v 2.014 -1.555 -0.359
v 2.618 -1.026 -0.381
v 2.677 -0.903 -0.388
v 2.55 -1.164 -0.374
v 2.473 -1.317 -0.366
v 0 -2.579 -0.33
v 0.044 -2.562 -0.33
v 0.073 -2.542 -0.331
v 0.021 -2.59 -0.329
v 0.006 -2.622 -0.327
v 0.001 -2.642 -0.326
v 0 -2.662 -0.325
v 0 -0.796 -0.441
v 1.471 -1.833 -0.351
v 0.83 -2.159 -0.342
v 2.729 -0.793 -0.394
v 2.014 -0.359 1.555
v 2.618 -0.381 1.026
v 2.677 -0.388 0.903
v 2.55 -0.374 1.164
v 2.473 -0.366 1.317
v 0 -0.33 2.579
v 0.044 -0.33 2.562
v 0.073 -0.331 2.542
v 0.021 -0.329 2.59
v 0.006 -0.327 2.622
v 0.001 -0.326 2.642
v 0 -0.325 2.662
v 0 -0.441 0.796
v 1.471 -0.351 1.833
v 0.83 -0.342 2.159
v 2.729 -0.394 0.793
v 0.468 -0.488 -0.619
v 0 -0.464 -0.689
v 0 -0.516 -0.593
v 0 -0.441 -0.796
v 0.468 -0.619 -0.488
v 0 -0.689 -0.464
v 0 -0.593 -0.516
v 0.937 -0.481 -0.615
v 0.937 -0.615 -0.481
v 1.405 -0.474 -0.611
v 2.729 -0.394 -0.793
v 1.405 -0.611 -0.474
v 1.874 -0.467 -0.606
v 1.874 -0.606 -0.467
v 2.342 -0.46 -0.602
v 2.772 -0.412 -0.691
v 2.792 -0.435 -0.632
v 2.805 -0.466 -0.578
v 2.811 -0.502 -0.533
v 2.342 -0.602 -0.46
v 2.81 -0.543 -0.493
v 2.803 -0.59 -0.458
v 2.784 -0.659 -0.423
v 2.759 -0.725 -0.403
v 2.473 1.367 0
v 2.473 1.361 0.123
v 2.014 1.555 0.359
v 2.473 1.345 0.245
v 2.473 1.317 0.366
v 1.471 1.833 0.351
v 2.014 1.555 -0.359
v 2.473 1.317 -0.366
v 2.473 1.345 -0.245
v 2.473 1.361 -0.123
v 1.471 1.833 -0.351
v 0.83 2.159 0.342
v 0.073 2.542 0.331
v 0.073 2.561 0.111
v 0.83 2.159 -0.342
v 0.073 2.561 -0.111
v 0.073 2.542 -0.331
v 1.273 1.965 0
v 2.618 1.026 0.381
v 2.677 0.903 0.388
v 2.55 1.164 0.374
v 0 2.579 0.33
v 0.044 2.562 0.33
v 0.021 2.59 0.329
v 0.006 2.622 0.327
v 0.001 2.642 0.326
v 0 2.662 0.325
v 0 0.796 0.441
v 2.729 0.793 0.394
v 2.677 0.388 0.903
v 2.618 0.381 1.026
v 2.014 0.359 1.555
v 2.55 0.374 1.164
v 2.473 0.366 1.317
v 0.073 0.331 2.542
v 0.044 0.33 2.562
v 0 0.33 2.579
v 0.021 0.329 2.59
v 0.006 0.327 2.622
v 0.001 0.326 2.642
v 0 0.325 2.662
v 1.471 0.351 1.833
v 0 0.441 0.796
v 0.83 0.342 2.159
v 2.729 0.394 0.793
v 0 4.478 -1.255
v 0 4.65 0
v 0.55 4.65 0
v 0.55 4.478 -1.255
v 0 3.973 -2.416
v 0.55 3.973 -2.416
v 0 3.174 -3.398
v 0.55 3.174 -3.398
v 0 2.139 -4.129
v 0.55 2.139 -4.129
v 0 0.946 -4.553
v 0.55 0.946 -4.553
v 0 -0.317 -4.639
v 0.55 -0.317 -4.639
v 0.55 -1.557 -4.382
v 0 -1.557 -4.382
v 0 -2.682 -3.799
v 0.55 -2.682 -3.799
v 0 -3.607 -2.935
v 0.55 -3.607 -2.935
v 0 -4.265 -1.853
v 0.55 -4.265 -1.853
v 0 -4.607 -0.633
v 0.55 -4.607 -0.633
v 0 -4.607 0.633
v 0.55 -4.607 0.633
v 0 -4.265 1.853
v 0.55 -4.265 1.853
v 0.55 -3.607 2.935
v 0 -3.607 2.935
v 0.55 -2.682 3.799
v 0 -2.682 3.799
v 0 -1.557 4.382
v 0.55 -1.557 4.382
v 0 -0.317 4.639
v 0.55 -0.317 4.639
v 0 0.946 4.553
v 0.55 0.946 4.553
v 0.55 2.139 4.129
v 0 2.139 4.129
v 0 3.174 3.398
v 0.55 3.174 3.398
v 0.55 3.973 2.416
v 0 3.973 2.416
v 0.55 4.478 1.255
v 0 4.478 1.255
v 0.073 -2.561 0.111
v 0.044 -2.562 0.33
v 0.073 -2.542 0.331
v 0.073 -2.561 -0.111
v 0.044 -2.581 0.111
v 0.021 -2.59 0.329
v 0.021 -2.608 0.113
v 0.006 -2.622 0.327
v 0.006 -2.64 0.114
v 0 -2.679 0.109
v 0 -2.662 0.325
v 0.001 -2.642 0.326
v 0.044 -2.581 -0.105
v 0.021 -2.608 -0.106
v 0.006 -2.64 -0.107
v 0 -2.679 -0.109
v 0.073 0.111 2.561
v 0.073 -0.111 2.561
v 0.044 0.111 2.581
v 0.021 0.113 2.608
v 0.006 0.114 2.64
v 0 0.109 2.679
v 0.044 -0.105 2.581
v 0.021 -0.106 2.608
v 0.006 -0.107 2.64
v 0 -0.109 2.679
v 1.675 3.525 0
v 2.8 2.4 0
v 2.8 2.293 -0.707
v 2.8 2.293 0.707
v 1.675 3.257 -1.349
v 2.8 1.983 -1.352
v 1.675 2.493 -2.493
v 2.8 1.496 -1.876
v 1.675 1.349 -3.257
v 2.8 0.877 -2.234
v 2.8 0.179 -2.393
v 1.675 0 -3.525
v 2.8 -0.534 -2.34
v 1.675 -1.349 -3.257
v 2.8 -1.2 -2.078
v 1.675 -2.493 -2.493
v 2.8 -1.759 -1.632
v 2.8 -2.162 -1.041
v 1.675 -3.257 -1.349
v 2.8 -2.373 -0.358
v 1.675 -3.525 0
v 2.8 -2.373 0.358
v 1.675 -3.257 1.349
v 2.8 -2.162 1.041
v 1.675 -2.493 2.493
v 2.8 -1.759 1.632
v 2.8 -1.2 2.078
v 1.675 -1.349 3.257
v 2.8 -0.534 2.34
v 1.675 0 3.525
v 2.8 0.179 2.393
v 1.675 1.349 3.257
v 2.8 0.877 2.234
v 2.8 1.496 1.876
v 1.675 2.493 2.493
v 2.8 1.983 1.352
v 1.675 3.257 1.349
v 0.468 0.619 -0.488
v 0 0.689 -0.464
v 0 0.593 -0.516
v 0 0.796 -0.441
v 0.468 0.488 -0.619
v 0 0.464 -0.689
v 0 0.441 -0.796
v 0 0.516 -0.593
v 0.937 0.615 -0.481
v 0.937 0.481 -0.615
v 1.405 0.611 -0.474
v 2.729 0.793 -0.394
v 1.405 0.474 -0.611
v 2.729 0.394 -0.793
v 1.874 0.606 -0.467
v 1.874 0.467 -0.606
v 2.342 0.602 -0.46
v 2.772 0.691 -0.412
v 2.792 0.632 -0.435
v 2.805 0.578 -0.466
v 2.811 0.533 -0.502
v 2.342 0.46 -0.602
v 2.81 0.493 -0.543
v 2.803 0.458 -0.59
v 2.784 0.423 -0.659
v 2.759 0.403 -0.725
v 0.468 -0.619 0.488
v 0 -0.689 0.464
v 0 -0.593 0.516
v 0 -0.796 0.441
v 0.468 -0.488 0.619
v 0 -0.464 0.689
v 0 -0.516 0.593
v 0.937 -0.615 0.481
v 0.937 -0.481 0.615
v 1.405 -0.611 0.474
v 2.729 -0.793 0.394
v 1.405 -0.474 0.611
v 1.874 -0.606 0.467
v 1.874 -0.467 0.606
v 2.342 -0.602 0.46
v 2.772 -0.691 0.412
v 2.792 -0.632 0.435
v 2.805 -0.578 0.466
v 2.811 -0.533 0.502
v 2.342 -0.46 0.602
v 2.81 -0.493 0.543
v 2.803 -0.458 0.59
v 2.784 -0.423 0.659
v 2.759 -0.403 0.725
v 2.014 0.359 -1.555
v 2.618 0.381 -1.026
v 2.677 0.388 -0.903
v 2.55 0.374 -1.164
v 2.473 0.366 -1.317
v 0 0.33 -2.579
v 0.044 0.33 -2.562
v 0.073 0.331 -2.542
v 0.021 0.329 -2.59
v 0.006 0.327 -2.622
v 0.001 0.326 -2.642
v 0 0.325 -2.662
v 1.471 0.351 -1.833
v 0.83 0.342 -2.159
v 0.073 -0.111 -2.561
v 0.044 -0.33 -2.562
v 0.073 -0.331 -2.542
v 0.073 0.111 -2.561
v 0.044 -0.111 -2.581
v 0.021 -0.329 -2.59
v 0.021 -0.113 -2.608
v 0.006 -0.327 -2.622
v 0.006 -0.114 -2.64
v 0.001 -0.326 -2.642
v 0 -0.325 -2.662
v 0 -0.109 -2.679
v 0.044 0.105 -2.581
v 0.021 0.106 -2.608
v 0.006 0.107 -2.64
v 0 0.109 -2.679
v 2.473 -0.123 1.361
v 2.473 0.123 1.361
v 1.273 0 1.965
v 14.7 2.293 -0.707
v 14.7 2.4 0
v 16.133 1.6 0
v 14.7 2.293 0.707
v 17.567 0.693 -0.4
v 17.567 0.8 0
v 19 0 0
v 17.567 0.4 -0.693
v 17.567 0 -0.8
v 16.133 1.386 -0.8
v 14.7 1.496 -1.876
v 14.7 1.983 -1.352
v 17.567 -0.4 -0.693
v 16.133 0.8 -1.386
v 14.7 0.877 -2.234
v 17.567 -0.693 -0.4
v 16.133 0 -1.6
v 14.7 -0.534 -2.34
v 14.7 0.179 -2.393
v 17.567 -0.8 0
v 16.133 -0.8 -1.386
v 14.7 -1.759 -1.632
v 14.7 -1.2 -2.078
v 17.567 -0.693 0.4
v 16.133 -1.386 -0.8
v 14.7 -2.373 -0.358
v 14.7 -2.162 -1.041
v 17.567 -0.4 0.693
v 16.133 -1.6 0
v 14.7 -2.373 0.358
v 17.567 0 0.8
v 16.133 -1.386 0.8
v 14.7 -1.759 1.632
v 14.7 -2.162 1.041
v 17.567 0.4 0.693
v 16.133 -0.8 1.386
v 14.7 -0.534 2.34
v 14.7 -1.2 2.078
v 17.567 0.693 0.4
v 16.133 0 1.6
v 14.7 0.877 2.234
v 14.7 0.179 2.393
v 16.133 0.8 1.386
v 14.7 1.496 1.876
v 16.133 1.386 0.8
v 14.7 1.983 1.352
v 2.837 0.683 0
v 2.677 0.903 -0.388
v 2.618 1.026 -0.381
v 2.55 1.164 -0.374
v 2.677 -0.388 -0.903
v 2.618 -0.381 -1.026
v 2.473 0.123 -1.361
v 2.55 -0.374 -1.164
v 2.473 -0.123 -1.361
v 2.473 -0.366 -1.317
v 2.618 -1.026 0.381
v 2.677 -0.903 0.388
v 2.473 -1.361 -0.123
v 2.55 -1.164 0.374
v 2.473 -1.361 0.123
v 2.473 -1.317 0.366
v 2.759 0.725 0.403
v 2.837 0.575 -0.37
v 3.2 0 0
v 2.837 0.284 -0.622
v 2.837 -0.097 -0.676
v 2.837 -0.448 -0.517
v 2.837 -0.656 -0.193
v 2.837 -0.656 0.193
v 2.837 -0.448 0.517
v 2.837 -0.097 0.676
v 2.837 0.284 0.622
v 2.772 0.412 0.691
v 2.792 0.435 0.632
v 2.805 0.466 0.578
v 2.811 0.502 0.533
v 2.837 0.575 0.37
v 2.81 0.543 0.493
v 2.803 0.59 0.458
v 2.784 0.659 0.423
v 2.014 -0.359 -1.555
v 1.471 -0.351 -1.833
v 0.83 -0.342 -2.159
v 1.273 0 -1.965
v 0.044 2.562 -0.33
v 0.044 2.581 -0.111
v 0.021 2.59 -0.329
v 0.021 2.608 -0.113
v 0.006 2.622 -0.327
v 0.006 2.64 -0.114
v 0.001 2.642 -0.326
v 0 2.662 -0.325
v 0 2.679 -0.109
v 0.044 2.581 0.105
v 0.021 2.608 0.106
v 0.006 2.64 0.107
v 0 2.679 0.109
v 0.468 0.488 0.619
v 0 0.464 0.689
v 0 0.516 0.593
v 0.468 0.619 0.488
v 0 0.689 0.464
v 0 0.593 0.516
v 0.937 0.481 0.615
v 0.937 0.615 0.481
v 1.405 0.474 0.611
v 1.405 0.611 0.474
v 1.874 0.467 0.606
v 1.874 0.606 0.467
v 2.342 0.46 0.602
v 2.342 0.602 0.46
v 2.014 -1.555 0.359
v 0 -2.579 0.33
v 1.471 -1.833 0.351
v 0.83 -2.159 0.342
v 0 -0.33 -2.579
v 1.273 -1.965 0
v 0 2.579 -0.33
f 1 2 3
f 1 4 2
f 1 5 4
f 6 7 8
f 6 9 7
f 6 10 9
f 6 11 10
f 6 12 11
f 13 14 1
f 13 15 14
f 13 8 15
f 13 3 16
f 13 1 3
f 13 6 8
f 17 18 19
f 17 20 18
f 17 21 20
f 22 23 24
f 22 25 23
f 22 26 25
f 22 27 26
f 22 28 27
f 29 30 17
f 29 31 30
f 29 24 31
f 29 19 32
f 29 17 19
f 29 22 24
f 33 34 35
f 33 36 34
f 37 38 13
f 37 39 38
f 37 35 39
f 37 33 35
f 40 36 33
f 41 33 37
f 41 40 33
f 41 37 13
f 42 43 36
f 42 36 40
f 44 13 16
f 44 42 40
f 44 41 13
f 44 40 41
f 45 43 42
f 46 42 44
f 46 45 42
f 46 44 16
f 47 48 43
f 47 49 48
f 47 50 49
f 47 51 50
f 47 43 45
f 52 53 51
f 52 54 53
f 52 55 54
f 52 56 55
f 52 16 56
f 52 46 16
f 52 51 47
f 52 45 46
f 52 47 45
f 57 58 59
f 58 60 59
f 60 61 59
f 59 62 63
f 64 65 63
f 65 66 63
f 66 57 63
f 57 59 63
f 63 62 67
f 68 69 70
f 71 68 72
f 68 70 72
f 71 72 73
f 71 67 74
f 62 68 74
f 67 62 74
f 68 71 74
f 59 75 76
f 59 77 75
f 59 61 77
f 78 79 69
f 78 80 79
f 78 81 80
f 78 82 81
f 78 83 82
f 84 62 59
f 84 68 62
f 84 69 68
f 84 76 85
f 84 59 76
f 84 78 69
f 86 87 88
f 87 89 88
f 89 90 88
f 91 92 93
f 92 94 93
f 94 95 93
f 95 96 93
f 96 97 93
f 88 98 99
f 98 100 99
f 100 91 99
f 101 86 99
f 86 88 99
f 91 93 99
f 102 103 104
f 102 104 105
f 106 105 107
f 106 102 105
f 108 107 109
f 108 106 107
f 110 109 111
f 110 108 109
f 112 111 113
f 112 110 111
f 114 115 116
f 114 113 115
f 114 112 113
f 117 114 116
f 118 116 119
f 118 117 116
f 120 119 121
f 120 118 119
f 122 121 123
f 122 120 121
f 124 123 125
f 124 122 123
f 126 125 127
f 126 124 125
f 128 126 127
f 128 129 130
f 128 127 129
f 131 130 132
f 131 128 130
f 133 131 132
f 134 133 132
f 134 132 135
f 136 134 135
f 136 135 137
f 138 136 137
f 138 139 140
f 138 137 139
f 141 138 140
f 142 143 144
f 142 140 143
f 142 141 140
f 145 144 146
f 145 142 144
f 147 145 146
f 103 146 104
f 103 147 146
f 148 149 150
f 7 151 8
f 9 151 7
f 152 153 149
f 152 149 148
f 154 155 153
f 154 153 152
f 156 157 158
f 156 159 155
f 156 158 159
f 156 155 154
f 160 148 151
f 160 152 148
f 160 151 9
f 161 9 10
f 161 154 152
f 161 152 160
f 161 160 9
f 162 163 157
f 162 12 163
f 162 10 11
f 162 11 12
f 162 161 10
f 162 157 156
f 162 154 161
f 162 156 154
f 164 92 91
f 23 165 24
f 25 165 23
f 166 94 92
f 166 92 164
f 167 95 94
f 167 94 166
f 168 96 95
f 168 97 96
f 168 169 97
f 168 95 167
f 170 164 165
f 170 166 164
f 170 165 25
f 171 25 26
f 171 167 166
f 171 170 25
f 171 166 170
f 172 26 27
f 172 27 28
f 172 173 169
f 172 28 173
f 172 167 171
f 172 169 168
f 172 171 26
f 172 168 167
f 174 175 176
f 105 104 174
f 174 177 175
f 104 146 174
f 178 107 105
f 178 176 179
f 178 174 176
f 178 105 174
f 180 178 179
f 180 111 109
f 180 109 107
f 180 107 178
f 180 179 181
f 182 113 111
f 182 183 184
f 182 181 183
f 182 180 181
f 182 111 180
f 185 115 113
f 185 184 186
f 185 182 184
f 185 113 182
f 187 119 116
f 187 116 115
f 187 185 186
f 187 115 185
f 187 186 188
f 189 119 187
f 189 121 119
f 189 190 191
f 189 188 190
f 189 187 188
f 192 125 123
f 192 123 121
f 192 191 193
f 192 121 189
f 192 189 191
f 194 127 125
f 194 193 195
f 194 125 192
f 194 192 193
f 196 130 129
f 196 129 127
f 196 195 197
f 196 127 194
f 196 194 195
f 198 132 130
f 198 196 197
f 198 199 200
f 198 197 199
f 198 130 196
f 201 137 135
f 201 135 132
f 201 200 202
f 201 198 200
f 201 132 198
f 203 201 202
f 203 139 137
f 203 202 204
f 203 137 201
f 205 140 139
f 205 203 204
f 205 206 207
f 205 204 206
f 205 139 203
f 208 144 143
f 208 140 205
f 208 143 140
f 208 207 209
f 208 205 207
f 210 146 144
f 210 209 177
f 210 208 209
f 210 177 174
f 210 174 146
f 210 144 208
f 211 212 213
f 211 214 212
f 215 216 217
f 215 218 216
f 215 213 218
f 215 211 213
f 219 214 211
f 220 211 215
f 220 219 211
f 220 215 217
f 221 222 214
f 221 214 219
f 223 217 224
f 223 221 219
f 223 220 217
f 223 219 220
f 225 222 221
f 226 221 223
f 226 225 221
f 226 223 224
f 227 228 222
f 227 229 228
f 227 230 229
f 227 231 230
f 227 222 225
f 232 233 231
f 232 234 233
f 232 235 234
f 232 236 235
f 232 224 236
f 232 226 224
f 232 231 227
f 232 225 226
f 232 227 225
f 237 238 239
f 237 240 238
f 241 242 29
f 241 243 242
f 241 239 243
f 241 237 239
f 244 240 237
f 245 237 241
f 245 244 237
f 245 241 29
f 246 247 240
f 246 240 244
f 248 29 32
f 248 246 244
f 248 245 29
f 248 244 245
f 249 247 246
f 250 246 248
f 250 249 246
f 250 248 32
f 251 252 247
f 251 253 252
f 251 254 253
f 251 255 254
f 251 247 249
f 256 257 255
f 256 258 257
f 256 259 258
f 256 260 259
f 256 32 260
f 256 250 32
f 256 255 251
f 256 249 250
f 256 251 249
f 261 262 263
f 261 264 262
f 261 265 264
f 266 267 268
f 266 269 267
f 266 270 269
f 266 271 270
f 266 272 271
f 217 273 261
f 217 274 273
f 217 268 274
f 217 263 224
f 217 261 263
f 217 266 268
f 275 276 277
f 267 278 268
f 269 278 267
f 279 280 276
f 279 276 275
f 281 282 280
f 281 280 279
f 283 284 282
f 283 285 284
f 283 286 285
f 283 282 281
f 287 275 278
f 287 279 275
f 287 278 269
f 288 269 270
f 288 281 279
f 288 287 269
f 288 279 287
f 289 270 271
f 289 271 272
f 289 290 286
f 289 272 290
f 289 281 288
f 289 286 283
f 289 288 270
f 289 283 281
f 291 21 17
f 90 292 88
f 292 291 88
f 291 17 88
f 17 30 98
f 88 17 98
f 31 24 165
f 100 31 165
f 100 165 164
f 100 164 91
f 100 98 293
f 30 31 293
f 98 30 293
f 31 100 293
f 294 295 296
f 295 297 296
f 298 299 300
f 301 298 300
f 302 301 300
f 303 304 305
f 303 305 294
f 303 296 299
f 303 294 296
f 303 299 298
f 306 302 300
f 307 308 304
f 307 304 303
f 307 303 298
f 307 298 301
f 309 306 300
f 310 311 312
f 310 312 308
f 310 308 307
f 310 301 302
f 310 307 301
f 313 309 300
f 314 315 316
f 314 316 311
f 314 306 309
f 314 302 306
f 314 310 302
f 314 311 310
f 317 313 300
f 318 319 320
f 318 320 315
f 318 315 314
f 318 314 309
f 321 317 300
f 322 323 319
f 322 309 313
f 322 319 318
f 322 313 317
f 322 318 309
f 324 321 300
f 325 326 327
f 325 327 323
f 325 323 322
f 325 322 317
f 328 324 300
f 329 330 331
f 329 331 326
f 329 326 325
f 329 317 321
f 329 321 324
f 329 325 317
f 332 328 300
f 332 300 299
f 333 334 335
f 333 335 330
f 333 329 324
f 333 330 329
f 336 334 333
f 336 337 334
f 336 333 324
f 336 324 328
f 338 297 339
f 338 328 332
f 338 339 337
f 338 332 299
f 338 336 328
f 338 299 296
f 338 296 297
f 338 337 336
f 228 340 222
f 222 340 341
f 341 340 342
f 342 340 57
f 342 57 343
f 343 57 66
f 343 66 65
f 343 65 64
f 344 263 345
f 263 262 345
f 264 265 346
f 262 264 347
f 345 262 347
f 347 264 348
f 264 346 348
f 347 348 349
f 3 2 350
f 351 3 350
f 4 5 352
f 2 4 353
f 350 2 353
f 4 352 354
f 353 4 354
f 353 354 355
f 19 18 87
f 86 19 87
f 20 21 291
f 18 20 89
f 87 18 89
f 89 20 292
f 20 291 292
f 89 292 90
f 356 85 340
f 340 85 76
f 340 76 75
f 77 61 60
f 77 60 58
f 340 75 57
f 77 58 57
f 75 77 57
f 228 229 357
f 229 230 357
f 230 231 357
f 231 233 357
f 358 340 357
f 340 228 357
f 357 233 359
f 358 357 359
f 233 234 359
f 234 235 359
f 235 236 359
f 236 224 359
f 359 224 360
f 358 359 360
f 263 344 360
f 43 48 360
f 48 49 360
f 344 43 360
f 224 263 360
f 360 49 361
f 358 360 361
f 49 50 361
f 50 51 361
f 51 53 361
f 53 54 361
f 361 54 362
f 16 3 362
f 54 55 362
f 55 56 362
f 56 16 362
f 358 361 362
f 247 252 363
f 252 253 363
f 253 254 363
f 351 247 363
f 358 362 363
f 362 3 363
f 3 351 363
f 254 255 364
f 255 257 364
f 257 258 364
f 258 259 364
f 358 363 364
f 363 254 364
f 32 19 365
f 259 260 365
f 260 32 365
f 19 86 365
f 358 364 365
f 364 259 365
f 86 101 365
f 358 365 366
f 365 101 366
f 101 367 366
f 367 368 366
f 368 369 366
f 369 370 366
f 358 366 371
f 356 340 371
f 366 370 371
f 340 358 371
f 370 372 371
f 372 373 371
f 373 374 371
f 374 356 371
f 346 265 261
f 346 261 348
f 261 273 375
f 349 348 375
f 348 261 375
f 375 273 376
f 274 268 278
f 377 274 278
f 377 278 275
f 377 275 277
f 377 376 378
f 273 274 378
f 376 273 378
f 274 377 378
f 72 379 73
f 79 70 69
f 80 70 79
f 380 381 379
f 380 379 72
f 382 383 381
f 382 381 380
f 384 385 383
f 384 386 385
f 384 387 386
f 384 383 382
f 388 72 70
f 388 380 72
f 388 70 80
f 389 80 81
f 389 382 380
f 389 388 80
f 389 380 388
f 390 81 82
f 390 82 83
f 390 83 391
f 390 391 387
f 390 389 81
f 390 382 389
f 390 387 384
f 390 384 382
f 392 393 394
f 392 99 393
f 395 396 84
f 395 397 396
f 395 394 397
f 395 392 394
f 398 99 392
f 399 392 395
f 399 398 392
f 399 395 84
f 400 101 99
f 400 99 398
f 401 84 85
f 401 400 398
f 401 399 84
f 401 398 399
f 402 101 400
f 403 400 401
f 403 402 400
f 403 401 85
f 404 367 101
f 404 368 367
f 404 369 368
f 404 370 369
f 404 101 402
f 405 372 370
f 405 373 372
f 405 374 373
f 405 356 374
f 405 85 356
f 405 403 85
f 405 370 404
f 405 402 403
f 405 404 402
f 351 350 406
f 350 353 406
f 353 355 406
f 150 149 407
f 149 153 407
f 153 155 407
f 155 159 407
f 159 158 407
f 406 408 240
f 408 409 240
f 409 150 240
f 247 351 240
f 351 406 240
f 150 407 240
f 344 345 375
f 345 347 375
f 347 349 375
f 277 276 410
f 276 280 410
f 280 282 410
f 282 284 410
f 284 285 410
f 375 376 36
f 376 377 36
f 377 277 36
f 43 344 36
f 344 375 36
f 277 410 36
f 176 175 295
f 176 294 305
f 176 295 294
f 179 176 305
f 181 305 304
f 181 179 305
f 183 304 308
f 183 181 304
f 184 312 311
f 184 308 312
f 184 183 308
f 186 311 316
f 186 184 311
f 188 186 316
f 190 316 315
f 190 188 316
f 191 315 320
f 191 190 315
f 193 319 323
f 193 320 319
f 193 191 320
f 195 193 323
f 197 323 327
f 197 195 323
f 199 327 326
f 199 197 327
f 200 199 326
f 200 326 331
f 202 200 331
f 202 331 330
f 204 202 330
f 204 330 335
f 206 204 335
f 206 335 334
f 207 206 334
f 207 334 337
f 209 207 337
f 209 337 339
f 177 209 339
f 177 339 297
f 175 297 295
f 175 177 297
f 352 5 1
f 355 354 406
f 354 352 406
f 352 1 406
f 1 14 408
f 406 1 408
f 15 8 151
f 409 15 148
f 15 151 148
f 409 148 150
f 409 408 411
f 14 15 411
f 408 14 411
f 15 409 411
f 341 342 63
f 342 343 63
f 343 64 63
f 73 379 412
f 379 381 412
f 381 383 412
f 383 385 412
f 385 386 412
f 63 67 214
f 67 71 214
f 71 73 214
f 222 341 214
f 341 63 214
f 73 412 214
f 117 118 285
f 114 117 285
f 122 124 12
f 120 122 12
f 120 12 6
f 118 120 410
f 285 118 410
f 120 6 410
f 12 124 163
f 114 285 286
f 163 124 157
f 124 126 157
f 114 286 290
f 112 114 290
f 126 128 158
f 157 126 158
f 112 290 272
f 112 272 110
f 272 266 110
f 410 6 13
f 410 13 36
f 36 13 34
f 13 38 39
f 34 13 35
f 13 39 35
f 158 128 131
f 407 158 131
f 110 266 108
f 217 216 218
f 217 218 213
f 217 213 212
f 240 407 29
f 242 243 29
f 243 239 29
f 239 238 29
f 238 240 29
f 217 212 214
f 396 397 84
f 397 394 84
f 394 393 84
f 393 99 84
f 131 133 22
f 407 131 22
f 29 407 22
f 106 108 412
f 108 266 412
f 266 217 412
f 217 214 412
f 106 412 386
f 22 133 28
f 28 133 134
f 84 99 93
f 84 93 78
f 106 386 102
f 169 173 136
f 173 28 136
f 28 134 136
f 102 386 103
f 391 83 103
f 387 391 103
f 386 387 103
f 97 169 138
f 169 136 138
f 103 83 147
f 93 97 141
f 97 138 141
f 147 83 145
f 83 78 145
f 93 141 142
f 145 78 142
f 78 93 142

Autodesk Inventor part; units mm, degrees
ref_plane "YZ Plane" through (0, 0, 0) normal (1, 0, 0) x (0, 1, 0)
ref_plane "XZ Plane" through (0, 0, 0) normal (0, 1, 0) x (-1, 0, 0)
sketch "Sketch1" plane through (0, 0, 0) normal (0, 0, 1) x (1, 0, 0)
  line L0 (3.2, 0) -> (19, 0)
  line L1 (19, 0) -> (19, 2.4)
  line L2 (19, 2.4) -> (2.8, 2.4)
  line L3 (0.55, 4.65) -> (0, 4.65)
  line L4 (-3.8, 0) -> (22.8, 0) projected
  line L5 (0, -0.93) -> (0, 5.58) projected
  line L6 (0, 2.6) -> (2.4732, 1.3669)
  line L7 (2.4732, 1.3669) -> (3.2, 0)
  line L8 (2.8, 2.4) -> (0.55, 4.65)
  line L9 (0, 4.65) -> (0, 2.6)
  dimension "d2" = 4.8
  dimension "d3" = 9.3
  dimension "d4" = 3.2
  dimension "d5" = 5.2
  dimension "d6" = 26.5
  dimension "d7" = 62
  dimension "d13" = 45
  dimension "d14" = 2.8
  dimension "d15" = 19
revolve "Body" add sketch "Sketch1" angle 360 about axis through (3.2, 0, 0) along (1, 0, 0) contours L7 L6 L5 L3 L8 L2 L1 L0
sketch "Sketch2" plane through (0, 0, 0) normal (-1, 0, 0) x (0, 0, 1)
  line L0 (0, -6.51) -> (0, 6.51) projected
  line L1 (-6.51, 0) -> (6.51, 0) projected
  line L2 (0, 2.6) -> (0, 0) construction
  line L3 (0, 0) -> (2.6, 0) construction
  arc A0 (0.78, 0) -> (0, 0.78) centre (0, 0) ccw construction
  line L4 (0, 0) -> (3.288, 3.288) construction
  arc A1 (0.91, 0) -> (0, 0.91) centre (0, 0) ccw construction
  line L5 (0.33, 2.579) -> (0.4413, 0.7958)
  line L6 (2.579, 0.33) -> (0.7958, 0.4413)
  arc A2 (0.4413, 0.7958) -> (0.7958, 0.4413) centre (0.8194, 0.8194) ccw
  arc A3 (2.6, 0) -> (2.579, 0.33) centre (0, 0) ccw
  arc A4 (0.33, 2.579) -> (0, 2.6) centre (0, 0) ccw
  arc A5 (2.579, 0.33) -> (0.33, 2.579) centre (0, 0) ccw
  line L7 (0.33, -2.579) -> (0.4413, -0.7958)
  line L8 (2.579, -0.33) -> (0.7958, -0.4413)
  arc A6 (0.7958, -0.4413) -> (0.4413, -0.7958) centre (0.8194, -0.8194) ccw
  arc A7 (2.579, -0.33) -> (2.6, 0) centre (0, 0) ccw
  arc A8 (0, -2.6) -> (0.33, -2.579) centre (0, 0) ccw
  arc A9 (0.33, -2.579) -> (2.579, -0.33) centre (0, 0) ccw
  line L9 (-0.33, 2.579) -> (-0.4413, 0.7958)
  line L10 (-2.579, 0.33) -> (-0.7958, 0.4413)
  arc A10 (-0.7958, 0.4413) -> (-0.4413, 0.7958) centre (-0.8194, 0.8194) ccw
  arc A11 (-2.579, 0.33) -> (-2.6, 0) centre (0, 0) ccw
  arc A12 (0, 2.6) -> (-0.33, 2.579) centre (0, 0) ccw
  arc A13 (-0.33, 2.579) -> (-2.579, 0.33) centre (0, 0) ccw
  arc A14 (-2.579, -0.33) -> (-0.33, -2.579) centre (0, 0) ccw
  arc A15 (-0.33, -2.579) -> (0, -2.6) centre (0, 0) ccw
  arc A16 (-2.6, 0) -> (-2.579, -0.33) centre (0, 0) ccw
  line L11 (-2.579, -0.33) -> (-0.7958, -0.4413)
  arc A17 (-0.4413, -0.7958) -> (-0.7958, -0.4413) centre (-0.8194, -0.8194) ccw
  line L12 (-0.33, -2.579) -> (-0.4413, -0.7958)
  circle A18 centre (0, 0) radius 4.65 projected
  circle A19 centre (0, 0) radius 2.6 projected
  dimension "d18" = 45
  dimension "d19" = 1.56
  dimension "d20" = 1.82
  dimension "d21" = 5.2
  dimension "d22" = 0.33
extrude "Slot" add sketch "Sketch2" against normal up to next draft 1 contours L7 A6 L8 A9 | A14 L11 A17 L12 | A13 L9 A10 L10 | L6 A2 L5 A5
fillet "Fillet1" radius 0.132 4 edges at (0, 2.6, 0) (0, 0, 2.6) (0, -2.6, 0) (0, 0, -2.6)
thread "Thread" size "4.8x1.6" class "6g" standard "Metric Forming Screw Threads" length 16.2
chamfer "Chamfer1" distance 2.4 distance2 4.3 1 edges at (19, -2.4, 0) measured on face at (19, 0.5988, 0.9655)
ref_plane "Work Plane2" through (2.8, 0, 0) normal (0, 1, 0) x (1, 0, 0)
equation "\"d2\" = NND"
equation "\"d3\" = KOD"
equation "\"d4\" = STI"
equation "\"d5\" = SDM"
equation "\"d13\" = 0.5 * SEWI"
equation "\"d14\" = KOH"
equation "\"d15\" = NLG"
equation "\"d19\" = 0.3 * SDM"
equation "\"d20\" = 0.35 * SDM"
equation "\"d21\" = SDM"
equation "\"d22\" = 0.5 * SBR"
equation "\"d45\" = STI"
equation "\"d25\" = 0.2 * SBR"
equation "\"d9\" = GEL"
equation "\"d11\" = -0.5 * GD2 + 0.5 * NND"
equation "\"d12\" = SPTZ"
equation "\"NND\" = 4.8"
equation "\"NLG\" = 19"
equation "\"GEL\" = 16.2"
equation "\"KOD\" = 9.3"
equation "\"KOH\" = 2.8"
equation "\"SDM\" = 5.2"
equation "\"STI\" = 3.2"
equation "\"SBR\" = 0.66"
equation "\"SPTZ\" = 4.3"
equation "\"GD2\" = 0"
equation "\"SEWI\" = 90deg"
equation "\"d0\" = NLG"
equation "\"d1\" = KOH"
equation "\"d17\" = SDM"
equation "\"EPV\" = 5.2"
equation "\"THREADDIA\" = 4.8"
equation "\"TOA\" = 30deg"
equation "\"PTC\" = 1.6"
equation "\"GD1\" = 3.58"
properties part number "ISO 7050 - ST 4.8 x 19 - C - H" material "Steel"
